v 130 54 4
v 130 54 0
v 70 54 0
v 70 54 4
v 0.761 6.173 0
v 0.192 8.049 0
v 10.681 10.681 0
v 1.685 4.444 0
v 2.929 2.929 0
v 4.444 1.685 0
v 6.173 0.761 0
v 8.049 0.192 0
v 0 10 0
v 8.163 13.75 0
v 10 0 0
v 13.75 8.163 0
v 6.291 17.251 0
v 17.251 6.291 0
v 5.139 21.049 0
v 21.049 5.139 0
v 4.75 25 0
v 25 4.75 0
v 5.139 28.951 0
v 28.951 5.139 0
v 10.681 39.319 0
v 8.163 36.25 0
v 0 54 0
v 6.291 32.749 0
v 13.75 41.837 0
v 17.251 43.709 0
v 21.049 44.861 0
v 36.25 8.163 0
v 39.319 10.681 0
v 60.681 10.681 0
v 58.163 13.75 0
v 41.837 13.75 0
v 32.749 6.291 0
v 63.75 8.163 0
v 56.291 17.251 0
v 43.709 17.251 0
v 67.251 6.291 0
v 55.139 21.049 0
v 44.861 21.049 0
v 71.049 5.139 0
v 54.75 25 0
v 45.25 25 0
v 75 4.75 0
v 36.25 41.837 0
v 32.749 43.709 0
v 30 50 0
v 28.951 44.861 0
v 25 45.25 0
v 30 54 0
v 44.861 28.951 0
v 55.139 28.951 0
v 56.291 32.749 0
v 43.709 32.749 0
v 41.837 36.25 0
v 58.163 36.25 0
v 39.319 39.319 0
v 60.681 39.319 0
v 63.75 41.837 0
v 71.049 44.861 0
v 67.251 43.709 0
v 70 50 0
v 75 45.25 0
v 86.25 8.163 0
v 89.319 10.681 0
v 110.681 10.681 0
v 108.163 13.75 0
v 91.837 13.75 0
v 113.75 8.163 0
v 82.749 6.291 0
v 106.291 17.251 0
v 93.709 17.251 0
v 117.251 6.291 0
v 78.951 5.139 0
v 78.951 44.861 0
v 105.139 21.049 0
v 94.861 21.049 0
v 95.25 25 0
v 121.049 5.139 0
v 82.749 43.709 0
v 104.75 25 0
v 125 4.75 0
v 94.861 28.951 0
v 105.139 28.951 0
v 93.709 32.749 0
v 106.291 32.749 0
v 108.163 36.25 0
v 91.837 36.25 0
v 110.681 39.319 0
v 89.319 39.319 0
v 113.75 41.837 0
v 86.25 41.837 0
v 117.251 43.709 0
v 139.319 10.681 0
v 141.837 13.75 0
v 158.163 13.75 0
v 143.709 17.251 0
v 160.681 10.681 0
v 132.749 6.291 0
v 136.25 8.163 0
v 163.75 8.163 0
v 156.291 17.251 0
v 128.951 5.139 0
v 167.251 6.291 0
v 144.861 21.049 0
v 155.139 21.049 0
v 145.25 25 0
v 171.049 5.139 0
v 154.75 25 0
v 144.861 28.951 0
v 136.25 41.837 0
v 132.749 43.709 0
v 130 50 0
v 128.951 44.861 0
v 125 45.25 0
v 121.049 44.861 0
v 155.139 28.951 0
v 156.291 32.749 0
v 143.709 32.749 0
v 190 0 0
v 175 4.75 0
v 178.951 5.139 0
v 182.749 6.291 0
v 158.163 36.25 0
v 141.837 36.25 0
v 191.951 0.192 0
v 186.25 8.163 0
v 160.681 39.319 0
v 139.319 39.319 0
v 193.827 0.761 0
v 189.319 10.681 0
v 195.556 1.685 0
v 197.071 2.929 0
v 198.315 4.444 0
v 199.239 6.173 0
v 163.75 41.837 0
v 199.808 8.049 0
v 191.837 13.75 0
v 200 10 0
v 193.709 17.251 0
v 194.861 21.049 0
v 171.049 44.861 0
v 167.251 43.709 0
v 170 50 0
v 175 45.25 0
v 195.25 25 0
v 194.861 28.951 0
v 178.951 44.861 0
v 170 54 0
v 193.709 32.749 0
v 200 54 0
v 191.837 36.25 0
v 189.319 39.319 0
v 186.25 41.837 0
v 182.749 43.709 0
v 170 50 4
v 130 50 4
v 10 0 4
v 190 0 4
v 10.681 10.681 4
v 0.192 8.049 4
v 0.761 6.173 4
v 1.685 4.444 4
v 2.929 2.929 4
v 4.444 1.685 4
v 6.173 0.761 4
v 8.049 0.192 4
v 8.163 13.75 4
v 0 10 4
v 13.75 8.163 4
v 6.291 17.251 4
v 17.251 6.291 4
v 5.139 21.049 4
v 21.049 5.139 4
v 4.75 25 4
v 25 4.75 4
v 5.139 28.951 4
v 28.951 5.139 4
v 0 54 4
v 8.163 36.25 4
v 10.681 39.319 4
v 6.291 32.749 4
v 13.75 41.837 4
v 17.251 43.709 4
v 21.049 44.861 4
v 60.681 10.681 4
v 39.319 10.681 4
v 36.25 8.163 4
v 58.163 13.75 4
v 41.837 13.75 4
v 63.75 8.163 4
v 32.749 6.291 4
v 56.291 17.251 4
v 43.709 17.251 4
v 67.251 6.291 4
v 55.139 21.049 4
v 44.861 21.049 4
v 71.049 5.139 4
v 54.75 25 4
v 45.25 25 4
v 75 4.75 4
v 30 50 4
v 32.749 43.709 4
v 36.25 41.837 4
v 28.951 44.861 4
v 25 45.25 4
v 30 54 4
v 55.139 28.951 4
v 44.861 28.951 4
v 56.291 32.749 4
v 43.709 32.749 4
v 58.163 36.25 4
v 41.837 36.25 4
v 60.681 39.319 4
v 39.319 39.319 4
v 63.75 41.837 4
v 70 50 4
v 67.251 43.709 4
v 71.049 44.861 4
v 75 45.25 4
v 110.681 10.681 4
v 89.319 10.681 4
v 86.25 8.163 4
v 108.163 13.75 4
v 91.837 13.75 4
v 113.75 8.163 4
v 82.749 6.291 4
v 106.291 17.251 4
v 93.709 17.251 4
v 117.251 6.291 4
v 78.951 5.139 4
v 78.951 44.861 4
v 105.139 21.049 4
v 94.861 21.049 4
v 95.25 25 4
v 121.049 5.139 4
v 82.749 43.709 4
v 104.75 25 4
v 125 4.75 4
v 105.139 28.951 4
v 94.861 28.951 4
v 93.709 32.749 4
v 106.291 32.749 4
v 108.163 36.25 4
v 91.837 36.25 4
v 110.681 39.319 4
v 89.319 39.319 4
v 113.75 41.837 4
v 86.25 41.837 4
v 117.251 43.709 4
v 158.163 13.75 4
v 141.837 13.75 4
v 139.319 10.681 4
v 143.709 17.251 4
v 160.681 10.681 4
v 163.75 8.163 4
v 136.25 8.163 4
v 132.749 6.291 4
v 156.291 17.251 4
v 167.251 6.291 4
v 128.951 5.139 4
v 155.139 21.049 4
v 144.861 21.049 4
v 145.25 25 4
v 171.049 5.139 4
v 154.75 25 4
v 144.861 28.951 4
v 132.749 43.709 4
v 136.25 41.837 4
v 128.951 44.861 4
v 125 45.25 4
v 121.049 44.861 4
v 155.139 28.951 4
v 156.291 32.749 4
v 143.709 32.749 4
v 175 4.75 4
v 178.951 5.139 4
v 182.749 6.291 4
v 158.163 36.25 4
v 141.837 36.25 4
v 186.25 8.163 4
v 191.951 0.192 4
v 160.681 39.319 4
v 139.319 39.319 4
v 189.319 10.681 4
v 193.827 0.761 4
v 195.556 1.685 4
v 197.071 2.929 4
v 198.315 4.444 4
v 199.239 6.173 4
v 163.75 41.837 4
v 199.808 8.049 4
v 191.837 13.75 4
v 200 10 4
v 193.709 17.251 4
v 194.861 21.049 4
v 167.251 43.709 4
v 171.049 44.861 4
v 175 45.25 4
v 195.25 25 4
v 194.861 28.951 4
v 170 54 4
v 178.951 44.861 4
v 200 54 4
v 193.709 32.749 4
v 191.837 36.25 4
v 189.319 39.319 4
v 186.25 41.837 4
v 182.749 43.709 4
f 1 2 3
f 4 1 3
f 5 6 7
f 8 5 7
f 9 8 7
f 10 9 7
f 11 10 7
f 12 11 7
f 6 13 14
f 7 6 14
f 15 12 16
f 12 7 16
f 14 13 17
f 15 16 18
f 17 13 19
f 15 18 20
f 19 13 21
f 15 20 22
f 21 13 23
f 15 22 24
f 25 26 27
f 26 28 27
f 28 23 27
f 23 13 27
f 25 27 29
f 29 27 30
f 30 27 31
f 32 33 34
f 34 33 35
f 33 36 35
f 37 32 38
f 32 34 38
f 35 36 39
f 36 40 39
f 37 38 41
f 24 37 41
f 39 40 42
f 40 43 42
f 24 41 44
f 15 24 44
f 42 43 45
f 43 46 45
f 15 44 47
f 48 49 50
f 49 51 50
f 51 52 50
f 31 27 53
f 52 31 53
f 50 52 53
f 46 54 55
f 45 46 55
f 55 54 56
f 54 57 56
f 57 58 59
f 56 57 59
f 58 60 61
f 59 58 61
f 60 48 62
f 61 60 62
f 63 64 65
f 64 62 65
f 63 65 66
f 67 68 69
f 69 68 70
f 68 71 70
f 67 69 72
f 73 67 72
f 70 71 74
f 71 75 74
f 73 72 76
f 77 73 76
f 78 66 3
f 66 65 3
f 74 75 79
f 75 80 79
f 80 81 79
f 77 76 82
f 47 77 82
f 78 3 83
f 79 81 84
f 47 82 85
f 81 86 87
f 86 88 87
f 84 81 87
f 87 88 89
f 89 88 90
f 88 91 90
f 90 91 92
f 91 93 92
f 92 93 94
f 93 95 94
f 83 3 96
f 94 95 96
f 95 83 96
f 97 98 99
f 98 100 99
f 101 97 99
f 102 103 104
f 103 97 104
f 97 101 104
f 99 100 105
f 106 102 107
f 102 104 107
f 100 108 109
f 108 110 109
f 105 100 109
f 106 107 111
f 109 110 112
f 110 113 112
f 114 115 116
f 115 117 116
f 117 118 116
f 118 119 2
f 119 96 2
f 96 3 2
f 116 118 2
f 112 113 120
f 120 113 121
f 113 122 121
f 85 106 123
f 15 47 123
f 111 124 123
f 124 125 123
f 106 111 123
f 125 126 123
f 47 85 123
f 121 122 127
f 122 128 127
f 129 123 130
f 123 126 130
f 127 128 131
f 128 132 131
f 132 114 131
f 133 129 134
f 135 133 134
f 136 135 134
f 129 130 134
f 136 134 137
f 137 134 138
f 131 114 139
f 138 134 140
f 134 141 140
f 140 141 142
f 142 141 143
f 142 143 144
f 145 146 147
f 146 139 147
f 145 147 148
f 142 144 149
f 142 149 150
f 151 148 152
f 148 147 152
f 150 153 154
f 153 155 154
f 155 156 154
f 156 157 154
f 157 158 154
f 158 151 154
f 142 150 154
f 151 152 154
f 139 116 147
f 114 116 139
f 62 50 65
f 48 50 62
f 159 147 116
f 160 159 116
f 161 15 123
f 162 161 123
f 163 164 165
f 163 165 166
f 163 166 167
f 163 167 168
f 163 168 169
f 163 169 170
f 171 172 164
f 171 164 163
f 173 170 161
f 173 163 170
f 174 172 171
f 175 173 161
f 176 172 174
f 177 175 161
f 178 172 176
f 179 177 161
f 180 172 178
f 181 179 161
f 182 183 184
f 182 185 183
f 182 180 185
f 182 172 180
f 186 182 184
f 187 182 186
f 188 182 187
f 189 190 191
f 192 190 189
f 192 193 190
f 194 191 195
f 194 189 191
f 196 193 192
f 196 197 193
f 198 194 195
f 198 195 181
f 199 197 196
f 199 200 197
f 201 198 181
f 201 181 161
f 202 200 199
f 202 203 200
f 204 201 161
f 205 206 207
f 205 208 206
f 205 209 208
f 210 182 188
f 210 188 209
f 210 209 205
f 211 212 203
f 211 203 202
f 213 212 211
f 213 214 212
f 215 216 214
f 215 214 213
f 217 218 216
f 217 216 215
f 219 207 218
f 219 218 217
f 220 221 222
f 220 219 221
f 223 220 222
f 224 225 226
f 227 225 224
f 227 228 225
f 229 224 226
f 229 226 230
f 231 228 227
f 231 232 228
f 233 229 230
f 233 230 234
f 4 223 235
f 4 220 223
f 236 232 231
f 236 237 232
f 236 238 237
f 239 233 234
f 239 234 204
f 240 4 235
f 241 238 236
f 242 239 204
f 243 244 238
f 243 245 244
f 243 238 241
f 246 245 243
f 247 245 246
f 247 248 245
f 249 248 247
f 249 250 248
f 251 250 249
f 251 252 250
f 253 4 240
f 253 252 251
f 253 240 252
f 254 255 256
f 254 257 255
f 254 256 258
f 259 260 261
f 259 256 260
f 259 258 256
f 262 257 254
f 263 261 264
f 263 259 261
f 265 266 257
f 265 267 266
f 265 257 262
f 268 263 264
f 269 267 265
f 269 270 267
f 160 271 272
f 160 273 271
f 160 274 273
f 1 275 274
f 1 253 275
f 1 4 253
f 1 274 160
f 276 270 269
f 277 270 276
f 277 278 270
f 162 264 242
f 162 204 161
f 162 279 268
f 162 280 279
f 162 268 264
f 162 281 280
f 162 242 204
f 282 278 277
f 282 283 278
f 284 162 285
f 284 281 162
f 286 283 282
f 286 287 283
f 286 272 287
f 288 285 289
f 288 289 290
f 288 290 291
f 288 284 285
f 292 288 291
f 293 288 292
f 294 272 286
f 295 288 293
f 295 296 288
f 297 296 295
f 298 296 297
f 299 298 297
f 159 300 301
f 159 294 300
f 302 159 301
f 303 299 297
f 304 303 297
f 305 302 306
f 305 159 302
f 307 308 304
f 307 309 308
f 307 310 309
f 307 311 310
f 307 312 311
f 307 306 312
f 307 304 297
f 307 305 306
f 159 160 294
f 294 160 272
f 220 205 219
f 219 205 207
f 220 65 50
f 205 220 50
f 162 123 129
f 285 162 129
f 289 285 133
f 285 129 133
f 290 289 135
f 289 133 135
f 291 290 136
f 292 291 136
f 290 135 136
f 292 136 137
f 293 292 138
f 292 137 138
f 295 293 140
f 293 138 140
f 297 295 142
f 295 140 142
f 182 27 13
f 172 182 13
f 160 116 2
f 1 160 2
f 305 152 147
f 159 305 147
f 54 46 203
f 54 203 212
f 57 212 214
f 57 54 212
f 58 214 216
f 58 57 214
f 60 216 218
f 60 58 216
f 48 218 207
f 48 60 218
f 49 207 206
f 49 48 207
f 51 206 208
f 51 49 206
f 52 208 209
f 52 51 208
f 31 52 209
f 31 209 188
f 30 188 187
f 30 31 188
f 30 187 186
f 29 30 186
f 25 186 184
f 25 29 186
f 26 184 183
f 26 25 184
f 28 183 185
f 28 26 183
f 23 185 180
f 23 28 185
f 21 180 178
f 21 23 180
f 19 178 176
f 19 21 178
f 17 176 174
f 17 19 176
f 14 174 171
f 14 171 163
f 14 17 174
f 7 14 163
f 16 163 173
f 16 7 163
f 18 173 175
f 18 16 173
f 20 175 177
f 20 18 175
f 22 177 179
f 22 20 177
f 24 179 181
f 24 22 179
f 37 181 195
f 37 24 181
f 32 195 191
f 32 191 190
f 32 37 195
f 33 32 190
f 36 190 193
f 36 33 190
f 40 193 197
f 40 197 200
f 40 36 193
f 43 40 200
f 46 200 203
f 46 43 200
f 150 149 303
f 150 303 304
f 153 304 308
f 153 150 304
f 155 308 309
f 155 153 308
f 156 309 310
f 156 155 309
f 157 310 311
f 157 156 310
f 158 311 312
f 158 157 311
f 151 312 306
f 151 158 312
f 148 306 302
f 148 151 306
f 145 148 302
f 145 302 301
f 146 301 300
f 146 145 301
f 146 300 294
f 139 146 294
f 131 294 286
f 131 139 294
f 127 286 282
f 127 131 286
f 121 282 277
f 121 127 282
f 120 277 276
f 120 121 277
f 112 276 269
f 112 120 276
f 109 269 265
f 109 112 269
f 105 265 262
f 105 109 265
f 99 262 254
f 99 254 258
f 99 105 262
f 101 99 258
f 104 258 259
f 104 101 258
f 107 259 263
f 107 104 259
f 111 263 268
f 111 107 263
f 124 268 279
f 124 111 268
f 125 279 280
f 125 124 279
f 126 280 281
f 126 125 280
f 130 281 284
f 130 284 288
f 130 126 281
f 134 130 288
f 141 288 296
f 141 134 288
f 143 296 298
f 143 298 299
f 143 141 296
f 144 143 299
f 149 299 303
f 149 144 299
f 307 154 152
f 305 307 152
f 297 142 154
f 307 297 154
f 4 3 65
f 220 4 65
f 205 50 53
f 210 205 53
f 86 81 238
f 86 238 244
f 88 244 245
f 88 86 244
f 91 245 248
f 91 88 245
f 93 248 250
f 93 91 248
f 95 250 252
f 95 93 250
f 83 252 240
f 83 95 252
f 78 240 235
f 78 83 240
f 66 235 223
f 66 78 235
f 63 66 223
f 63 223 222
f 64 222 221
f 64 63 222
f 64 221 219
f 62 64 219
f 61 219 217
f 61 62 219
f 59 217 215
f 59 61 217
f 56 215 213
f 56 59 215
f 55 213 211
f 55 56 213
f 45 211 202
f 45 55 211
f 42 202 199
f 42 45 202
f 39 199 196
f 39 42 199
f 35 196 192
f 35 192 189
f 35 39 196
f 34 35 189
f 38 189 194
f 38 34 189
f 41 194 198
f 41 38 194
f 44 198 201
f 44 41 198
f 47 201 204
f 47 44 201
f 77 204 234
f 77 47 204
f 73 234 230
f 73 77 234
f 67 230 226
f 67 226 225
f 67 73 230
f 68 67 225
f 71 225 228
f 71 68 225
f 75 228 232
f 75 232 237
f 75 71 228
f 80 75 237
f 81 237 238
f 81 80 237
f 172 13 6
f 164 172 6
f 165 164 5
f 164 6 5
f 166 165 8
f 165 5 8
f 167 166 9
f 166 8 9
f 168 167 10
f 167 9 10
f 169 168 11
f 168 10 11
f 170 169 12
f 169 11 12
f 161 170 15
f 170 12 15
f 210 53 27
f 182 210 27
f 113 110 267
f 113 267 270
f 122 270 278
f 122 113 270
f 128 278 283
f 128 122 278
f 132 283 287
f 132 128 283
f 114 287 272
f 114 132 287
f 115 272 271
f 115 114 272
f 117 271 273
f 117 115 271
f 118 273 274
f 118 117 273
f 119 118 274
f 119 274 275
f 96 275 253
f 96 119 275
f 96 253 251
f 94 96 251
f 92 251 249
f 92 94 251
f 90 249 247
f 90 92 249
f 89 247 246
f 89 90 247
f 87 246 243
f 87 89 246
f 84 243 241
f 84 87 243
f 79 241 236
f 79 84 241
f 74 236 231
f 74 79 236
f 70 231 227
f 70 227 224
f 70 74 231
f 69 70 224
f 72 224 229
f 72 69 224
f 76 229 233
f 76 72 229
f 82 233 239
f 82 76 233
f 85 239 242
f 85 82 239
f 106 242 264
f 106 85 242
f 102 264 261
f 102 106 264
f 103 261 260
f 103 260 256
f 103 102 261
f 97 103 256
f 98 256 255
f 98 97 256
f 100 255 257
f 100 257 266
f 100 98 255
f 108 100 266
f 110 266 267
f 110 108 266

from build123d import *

# Parameters (mm, degrees)
SKETCH1_R           = 20.25
BOSS_EXTRUDE1_DEPTH = 4


with BuildPart() as part:
    # Sketch1 → Boss-Extrude1 (new body)
    with BuildSketch(Plane.XY):
        with BuildLine():
            Line((10, 0), (190, 0))
            ThreePointArc((190, 0), (197.071067812, 2.928932188), (200, 10))
            Line((200, 10), (200, 50))
            Line((200, 50), (200, 54))
            Line((200, 54), (170, 54))
            Line((170, 54), (170, 50))
            Line((170, 50), (130, 50))
            Line((130, 50), (130, 54))
            Line((130, 54), (70, 54))
            Line((70, 54), (70, 50))
            Line((70, 50), (30, 50))
            Line((30, 50), (30, 54))
            Line((30, 54), (0, 54))
            Line((0, 54), (0, 50))
            Line((0, 50), (0, 10))
            ThreePointArc((0, 10), (2.928932188, 2.928932188), (10, 0))
        make_face()
        with Locations((25, 25)):
            Circle(SKETCH1_R, mode=Mode.SUBTRACT)
        with Locations((75, 25)):
            Circle(SKETCH1_R, mode=Mode.SUBTRACT)
        with Locations((125, 25)):
            Circle(SKETCH1_R, mode=Mode.SUBTRACT)
        with Locations((175, 25)):
            Circle(SKETCH1_R, mode=Mode.SUBTRACT)
    extrude(amount=BOSS_EXTRUDE1_DEPTH)


solid = part.part
